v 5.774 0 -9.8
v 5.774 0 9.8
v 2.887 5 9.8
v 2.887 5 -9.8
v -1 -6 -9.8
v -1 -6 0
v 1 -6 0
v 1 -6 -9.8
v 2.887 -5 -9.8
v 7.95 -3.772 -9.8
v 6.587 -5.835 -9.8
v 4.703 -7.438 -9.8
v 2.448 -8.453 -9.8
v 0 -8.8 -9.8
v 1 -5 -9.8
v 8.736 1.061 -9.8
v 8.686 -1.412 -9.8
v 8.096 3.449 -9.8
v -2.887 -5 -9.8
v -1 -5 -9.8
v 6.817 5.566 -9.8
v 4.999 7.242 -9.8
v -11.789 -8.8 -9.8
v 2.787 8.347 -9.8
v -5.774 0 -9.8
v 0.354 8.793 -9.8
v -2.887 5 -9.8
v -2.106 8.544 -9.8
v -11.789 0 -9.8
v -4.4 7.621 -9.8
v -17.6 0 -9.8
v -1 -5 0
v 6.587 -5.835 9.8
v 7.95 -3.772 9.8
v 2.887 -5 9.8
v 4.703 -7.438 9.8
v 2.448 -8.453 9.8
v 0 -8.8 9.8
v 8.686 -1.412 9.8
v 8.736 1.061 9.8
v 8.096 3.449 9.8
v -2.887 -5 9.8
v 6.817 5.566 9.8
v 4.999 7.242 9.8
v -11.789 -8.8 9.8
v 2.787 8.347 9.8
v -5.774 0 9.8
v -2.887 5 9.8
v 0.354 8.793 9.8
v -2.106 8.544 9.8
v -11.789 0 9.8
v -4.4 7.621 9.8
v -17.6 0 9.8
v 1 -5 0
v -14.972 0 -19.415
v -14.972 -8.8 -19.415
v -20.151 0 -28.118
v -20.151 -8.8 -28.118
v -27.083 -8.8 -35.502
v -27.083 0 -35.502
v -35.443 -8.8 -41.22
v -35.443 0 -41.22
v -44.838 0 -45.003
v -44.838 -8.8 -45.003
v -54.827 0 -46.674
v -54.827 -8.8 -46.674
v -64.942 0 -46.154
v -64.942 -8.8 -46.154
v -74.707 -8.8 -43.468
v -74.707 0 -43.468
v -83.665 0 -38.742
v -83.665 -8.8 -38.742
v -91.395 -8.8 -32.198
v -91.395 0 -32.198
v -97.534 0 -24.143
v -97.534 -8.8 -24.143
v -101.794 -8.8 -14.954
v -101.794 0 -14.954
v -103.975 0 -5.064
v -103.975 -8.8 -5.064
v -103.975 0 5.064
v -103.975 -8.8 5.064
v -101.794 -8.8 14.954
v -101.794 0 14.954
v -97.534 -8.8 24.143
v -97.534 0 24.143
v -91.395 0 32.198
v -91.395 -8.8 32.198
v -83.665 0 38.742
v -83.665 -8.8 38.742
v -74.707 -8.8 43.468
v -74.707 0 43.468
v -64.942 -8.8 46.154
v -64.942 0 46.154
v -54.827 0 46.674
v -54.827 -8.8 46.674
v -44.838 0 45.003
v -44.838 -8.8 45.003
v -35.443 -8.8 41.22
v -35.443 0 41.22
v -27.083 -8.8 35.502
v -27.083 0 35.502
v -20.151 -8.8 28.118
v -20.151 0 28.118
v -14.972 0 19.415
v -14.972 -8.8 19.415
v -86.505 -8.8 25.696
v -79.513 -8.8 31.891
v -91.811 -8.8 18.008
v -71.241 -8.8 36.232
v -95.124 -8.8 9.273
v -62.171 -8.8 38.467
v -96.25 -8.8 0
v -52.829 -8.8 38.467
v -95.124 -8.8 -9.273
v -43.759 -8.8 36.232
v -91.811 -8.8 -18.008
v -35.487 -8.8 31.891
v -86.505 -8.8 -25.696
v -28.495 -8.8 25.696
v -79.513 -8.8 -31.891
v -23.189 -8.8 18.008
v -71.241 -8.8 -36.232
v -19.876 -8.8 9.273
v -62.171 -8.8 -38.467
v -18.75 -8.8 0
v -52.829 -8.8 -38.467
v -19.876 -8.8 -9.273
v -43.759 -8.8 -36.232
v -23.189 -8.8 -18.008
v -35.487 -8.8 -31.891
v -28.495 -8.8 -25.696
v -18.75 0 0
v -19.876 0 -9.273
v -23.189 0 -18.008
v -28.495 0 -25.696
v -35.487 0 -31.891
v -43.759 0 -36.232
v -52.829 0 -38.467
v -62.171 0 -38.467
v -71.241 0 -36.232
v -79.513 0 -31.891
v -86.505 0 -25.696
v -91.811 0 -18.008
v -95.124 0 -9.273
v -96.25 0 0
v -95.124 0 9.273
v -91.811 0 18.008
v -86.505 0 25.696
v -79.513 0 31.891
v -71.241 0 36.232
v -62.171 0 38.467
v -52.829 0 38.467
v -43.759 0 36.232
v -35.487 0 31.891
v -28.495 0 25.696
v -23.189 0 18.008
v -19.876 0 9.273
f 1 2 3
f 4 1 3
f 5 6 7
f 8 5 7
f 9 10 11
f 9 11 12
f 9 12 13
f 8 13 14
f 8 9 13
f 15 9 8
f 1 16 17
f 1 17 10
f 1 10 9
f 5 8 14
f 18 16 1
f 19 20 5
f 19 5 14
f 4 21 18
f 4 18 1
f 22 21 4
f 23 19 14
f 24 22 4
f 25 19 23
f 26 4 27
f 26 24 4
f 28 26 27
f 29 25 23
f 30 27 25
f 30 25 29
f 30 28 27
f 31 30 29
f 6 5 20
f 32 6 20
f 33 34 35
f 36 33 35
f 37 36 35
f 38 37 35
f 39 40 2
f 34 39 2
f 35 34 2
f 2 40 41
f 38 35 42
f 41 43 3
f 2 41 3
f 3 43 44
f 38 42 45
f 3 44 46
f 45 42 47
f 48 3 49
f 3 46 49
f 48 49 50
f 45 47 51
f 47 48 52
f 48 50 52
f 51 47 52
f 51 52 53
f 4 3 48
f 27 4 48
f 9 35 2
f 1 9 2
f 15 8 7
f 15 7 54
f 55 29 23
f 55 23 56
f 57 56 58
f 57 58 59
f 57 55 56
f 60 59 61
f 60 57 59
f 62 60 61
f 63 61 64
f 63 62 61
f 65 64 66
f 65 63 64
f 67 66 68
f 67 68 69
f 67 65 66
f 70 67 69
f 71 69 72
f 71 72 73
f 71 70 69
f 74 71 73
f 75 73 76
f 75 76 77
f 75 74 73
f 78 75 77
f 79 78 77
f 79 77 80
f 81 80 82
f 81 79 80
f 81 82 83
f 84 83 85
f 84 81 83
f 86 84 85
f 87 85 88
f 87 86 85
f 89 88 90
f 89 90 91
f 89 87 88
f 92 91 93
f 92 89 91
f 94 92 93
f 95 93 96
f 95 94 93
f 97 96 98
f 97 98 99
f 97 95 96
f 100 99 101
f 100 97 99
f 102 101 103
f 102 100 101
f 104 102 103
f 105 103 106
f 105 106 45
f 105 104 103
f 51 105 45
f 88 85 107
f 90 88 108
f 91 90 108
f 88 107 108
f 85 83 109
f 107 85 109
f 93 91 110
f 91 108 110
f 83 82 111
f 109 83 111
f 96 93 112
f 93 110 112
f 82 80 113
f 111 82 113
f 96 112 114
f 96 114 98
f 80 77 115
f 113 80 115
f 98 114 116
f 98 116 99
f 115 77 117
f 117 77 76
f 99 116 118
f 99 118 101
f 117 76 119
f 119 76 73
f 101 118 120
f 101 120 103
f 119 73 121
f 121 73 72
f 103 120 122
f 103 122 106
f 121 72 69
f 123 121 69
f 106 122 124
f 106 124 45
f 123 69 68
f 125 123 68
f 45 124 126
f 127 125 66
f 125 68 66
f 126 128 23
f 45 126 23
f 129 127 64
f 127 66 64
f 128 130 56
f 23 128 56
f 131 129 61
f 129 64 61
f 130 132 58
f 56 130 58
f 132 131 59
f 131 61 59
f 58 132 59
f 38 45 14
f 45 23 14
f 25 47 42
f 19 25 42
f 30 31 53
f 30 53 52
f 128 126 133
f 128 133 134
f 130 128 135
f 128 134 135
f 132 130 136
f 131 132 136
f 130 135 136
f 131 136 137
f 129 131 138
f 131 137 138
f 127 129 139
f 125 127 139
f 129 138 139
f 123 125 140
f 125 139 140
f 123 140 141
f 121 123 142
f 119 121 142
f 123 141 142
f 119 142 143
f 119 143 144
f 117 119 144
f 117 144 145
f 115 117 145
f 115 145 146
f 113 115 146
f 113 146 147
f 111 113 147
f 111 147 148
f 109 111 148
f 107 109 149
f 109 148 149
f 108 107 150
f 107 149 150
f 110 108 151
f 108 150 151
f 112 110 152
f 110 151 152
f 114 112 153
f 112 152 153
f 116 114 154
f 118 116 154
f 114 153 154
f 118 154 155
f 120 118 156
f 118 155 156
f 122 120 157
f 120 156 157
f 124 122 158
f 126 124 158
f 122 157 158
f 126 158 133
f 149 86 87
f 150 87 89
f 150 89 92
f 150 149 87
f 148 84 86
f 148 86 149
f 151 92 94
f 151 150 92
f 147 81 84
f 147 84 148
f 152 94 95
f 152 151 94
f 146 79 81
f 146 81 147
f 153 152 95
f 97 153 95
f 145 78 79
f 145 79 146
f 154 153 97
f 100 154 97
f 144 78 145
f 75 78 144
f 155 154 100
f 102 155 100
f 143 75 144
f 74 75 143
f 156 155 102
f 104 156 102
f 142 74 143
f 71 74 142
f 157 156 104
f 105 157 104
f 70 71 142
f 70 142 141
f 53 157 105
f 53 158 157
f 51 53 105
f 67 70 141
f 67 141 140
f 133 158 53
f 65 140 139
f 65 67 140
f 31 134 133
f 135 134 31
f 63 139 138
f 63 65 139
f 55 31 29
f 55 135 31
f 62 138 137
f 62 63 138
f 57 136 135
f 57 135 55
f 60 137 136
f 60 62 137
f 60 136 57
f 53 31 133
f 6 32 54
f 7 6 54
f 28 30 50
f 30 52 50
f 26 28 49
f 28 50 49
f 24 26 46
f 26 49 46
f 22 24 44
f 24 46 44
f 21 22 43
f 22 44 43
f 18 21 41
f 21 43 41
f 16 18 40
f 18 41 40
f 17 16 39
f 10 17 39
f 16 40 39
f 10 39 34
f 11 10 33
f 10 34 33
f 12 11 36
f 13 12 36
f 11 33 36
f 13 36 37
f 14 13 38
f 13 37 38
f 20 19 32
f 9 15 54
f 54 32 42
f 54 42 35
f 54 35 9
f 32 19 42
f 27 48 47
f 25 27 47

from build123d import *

# Parameters (mm, degrees)
SKETCH2_R                      = 38.75
BOSS_EXTRUDE1_DEPTH            = 8.8
BOSS_EXTRUDE2_DEPTH            = 9.8
BOSS_EXTRUDE2_DEPTH_BACK       = 9.8
CUT_EXTRUDE1_REACH             = 116.591
CUT_EXTRUDE1_DIRECTION_2_REACH = 116.591
CUT_EXTRUDE2_REACH             = 116.591
SKETCH5_W                      = 2
SKETCH5_H                      = 1


with BuildPart() as part:
    # Sketch2 → Boss-Extrude1 (new body)
    with BuildSketch(Plane(origin=(0, 0, 0), x_dir=(1, 0, 0), z_dir=(0, 1, 0))):
        with BuildLine():
            Line((-11.788704897, -9.8), (0, -9.8))
            Line((0, -9.8), (0, 9.8))
            Line((0, 9.8), (-11.788704897, 9.8))
            ThreePointArc((-11.788704897, 9.8), (-104.25, 0), (-11.788704897, -9.8))
        make_face()
        with Locations((-57.5, 0)):
            Circle(SKETCH2_R, mode=Mode.SUBTRACT)
    extrude(amount=-BOSS_EXTRUDE1_DEPTH)

    # Sketch3 → Boss-Extrude2 (add, two sides: drawn at the far end of the back side and taken through both)
    with BuildSketch(Plane.XY.offset(-BOSS_EXTRUDE2_DEPTH_BACK)):
        with BuildLine():
            Line((0, -8.8), (0, 0))
            Line((0, 0), (-17.6, 0))
            Line((-17.6, 0), (-4.4, 7.621023553))
            ThreePointArc((-4.4, 7.621023553), (8.500147271, 2.277607597), (0, -8.8))
        make_face()
    extrude(amount=BOSS_EXTRUDE2_DEPTH + BOSS_EXTRUDE2_DEPTH_BACK)

    # Sketch4 → Cut-Extrude1 (cut, up to next)
    with BuildSketch(Plane.XY, mode=Mode.PRIVATE) as cut_extrude1_sk1:
        Polygon((5.773502692, 0), (2.886751346, 5), (-2.886751346, 5), (-5.773502692, 0), (-2.886751346, -5), (2.886751346, -5), align=None)
    cut_extrude1_tool1 = extrude(cut_extrude1_sk1.sketch, amount=-CUT_EXTRUDE1_REACH, mode=Mode.PRIVATE) & part.part
    add(cut_extrude1_tool1.solids().sort_by_distance((0, 0, 0))[0], mode=Mode.SUBTRACT)

    # Sketch4 → Cut-Extrude1 direction 2 (cut, up to next)
    with BuildSketch(Plane.XY, mode=Mode.PRIVATE) as cut_extrude1_direction_2_sk1:
        Polygon((5.773502692, 0), (2.886751346, 5), (-2.886751346, 5), (-5.773502692, 0), (-2.886751346, -5), (2.886751346, -5), align=None)
    cut_extrude1_direction_2_tool1 = extrude(cut_extrude1_direction_2_sk1.sketch, amount=CUT_EXTRUDE1_DIRECTION_2_REACH, mode=Mode.PRIVATE) & part.part
    add(cut_extrude1_direction_2_tool1.solids().sort_by_distance((0, 0, 0))[0], mode=Mode.SUBTRACT)

    # Sketch5 → Cut-Extrude2 (cut, up to next)
    with BuildSketch(Plane.XY, mode=Mode.PRIVATE) as cut_extrude2_sk1:
        with Locations((0, -5.5)):
            Rectangle(SKETCH5_W, SKETCH5_H)
    cut_extrude2_tool1 = extrude(cut_extrude2_sk1.sketch, amount=-CUT_EXTRUDE2_REACH, mode=Mode.PRIVATE) & part.part
    add(cut_extrude2_tool1.solids().sort_by_distance((0, -5.5, 0))[0], mode=Mode.SUBTRACT)


solid = part.part
